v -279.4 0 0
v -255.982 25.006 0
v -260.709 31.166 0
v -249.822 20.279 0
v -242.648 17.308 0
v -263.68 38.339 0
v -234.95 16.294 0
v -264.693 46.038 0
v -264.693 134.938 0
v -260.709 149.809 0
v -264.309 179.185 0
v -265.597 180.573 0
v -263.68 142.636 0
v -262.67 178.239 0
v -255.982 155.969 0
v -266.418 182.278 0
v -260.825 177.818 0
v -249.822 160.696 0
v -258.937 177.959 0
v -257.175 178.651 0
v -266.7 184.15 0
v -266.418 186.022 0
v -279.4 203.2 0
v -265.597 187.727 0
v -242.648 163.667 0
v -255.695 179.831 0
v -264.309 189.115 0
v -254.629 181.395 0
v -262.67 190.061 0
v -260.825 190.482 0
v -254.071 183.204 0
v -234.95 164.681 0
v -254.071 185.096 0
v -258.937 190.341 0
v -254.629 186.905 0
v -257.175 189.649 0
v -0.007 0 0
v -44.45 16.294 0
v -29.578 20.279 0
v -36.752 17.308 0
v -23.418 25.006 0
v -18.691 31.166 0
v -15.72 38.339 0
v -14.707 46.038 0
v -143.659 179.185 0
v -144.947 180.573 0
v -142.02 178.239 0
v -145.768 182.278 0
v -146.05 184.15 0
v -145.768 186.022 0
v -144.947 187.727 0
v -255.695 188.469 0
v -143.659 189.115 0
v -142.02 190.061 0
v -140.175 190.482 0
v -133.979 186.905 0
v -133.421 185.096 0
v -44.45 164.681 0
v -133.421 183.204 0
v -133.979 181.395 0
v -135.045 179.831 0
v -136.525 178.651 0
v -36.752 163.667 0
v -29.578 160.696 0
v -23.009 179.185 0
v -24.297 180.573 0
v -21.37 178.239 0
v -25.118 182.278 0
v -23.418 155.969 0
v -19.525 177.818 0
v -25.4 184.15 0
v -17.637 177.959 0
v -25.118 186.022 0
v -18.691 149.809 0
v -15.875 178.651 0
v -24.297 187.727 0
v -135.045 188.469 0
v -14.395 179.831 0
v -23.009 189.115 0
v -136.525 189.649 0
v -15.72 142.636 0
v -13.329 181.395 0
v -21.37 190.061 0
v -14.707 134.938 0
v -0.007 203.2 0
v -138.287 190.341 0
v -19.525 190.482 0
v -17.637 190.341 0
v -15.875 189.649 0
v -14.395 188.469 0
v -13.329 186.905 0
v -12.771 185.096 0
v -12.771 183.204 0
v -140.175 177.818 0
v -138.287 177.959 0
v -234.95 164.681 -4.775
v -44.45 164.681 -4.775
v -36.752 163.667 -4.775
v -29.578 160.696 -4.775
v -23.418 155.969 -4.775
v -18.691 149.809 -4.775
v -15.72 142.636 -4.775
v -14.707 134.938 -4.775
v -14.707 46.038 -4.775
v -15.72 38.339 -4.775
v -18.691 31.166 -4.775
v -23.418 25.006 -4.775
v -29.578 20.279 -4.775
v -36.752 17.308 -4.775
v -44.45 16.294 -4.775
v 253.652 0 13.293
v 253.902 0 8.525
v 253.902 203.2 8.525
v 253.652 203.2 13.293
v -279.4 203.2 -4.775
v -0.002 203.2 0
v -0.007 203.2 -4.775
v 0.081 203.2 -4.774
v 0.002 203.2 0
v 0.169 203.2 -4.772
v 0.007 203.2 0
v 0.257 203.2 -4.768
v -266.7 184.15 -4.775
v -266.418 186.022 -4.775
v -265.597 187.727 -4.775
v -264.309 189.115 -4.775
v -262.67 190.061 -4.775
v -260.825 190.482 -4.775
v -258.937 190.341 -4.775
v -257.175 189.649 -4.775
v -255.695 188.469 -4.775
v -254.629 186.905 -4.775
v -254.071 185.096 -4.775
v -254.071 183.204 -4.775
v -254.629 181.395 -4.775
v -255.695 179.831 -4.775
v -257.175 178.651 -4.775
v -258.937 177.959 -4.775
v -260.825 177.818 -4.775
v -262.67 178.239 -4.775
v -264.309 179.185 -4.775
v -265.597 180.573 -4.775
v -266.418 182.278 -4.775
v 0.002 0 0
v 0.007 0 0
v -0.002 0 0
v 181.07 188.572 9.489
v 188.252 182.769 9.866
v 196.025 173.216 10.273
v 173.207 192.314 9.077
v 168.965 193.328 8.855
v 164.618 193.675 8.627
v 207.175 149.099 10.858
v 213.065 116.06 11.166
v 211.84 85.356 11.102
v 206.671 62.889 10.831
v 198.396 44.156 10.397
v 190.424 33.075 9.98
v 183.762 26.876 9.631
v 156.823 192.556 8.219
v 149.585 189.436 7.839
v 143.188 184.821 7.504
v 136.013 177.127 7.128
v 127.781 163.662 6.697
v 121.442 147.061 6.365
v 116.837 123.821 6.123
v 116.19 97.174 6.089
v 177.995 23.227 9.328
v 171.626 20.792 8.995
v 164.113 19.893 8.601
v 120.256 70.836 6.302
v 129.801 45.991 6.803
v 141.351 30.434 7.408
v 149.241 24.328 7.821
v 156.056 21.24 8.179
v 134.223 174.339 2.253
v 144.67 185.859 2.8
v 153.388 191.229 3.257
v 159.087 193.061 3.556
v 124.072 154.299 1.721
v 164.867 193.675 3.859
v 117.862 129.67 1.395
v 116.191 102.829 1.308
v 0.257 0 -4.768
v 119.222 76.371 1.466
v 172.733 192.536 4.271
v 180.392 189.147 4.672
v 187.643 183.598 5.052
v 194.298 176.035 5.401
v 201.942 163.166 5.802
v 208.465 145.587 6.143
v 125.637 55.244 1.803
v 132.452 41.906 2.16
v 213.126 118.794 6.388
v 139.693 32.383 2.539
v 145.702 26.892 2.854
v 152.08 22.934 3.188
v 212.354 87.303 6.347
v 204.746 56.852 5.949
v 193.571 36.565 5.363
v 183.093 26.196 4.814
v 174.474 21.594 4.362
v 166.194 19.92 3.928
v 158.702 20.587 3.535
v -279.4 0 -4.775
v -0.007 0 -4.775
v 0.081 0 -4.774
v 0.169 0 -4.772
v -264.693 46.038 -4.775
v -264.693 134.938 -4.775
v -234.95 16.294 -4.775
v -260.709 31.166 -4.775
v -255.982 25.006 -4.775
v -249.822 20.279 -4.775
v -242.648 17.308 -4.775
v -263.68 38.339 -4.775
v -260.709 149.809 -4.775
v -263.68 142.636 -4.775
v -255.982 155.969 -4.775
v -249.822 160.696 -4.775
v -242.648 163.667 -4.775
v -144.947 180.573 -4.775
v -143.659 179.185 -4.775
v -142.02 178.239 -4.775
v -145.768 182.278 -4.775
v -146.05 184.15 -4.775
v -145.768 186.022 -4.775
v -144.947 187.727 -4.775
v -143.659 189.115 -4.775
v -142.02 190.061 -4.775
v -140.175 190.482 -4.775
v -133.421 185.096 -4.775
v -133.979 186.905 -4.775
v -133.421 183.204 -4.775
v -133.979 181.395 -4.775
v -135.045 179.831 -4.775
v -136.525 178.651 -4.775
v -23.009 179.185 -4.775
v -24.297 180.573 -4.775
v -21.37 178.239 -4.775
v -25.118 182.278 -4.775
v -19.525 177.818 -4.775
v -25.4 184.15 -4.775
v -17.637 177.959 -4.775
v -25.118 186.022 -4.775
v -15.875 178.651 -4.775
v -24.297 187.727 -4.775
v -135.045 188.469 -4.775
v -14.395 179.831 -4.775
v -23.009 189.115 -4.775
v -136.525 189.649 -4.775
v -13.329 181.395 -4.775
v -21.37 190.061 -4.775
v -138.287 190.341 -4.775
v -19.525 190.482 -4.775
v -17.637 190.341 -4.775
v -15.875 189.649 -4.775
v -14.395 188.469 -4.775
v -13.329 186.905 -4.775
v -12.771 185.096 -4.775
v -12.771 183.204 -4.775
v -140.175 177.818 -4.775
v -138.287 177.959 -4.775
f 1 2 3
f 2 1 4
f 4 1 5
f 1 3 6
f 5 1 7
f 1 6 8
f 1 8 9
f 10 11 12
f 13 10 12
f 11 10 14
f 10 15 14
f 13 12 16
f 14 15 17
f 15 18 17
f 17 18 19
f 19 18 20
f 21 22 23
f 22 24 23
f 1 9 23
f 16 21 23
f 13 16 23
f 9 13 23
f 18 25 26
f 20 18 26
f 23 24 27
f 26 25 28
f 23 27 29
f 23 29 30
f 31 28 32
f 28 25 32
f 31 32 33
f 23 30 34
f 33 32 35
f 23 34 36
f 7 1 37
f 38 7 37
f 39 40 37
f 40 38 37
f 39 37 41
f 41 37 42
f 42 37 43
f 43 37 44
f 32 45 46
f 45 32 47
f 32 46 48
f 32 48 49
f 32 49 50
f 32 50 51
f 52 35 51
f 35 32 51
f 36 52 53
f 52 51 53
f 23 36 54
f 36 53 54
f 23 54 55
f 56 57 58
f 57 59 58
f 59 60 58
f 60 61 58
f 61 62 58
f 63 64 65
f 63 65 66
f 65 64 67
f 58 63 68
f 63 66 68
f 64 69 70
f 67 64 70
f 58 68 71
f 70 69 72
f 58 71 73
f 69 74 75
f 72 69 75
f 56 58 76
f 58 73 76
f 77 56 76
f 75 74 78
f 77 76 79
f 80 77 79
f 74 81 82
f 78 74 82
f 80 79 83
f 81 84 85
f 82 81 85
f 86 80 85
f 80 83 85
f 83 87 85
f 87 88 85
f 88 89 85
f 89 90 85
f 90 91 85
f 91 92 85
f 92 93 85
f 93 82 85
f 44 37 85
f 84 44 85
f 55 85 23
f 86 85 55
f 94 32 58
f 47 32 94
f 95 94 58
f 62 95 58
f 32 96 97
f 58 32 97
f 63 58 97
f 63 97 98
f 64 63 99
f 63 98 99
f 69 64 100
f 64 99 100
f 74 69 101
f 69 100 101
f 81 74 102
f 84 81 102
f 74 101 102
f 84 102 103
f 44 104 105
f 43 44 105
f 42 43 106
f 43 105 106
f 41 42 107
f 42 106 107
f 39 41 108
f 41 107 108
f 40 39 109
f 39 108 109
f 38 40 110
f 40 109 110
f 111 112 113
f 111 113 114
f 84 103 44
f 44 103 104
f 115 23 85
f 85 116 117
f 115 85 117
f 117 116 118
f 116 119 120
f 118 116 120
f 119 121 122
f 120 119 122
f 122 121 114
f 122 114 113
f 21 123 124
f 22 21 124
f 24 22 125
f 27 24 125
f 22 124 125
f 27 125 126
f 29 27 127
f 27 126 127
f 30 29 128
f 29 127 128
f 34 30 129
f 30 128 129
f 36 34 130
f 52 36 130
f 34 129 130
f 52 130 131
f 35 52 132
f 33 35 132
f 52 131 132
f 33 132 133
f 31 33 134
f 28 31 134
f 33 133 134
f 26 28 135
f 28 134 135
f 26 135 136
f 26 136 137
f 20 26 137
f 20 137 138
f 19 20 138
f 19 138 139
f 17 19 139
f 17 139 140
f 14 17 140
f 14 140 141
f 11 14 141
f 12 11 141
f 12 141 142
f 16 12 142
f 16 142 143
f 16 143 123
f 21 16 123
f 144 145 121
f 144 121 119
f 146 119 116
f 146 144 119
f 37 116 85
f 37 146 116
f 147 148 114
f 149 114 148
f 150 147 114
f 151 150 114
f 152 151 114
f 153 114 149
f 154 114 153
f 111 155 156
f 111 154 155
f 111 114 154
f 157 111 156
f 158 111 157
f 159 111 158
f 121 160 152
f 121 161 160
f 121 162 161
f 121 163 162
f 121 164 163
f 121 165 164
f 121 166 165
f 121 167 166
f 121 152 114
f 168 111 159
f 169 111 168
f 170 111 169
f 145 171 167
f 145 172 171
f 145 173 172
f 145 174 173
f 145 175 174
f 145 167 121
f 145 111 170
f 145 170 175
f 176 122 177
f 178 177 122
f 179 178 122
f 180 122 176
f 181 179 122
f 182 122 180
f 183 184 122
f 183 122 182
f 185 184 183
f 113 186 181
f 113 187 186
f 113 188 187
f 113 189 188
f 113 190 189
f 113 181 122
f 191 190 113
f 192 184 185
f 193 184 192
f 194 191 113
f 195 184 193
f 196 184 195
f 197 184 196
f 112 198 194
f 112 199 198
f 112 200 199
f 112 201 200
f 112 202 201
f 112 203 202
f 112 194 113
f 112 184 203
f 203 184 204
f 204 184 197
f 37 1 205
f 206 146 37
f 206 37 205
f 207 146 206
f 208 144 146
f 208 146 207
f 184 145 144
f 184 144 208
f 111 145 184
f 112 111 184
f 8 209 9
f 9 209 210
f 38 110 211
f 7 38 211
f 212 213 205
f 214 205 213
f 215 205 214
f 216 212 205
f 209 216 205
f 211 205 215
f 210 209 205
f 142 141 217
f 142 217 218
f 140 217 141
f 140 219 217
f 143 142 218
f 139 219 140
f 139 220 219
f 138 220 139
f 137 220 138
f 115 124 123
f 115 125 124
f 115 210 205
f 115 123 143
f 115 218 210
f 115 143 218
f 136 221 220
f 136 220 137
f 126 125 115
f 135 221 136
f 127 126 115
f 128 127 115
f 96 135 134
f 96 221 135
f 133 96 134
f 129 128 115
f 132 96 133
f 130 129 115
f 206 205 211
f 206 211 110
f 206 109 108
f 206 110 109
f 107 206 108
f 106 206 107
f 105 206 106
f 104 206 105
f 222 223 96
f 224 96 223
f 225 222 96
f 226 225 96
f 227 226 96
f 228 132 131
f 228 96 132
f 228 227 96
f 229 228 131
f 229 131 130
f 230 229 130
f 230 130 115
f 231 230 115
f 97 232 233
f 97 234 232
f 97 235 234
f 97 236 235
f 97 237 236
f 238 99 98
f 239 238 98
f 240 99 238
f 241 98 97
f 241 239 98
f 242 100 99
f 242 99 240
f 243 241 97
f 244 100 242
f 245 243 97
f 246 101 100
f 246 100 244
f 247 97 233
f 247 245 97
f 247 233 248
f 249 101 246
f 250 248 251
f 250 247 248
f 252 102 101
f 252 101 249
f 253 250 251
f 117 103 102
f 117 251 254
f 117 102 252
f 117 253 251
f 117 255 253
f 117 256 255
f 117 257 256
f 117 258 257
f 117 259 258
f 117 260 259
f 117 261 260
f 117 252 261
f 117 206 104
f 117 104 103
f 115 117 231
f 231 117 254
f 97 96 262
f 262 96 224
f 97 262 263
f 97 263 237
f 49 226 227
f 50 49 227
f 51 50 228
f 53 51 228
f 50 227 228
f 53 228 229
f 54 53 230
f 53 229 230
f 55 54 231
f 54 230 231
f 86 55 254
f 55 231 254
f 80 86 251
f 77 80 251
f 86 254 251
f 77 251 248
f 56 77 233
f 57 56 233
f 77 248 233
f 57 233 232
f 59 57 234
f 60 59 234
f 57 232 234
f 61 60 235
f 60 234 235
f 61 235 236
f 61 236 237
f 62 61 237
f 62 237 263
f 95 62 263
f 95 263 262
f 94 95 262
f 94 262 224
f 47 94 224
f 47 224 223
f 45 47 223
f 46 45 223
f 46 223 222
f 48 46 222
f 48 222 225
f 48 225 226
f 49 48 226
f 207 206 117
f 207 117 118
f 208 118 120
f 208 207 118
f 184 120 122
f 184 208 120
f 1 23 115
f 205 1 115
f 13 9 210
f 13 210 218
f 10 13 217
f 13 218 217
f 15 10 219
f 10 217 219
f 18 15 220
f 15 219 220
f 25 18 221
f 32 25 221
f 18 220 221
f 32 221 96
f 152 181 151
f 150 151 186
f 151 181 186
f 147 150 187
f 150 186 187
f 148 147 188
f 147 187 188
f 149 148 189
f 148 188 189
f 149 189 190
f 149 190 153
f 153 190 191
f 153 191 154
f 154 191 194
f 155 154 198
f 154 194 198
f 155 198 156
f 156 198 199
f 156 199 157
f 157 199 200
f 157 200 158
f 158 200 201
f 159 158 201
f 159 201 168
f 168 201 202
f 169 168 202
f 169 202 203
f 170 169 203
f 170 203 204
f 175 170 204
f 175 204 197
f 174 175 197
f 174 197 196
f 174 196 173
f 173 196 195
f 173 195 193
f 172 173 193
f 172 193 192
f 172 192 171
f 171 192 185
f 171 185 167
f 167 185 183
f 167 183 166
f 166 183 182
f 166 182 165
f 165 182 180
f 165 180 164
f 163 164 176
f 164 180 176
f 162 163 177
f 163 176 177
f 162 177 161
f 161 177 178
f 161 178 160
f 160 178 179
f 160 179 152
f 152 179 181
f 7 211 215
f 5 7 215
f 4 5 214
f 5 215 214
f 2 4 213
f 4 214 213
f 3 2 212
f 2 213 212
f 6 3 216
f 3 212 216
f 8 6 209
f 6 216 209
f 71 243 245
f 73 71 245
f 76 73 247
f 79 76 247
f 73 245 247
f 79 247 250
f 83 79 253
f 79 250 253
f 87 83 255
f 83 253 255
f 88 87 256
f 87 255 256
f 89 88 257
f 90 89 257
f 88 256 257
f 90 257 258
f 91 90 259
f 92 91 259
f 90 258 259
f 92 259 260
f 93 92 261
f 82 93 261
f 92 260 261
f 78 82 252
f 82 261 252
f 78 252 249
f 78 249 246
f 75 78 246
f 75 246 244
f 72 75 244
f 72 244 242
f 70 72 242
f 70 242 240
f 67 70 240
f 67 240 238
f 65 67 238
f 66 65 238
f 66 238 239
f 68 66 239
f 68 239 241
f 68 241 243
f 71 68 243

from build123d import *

# Parameters (mm, degrees)
SKETCH1_W                    = 4.7752
SKETCH1_H                    = 203.2
BASE_FLANGE1_DEPTH           = 279.4
SKETCH2_R                    = 6.35
CUT_EXTRUDE1_DEPTH           = 10.16
CUT_EXTRUDE2_DEPTH           = 4.7752
EDGE_FLANGE2_STRIP_CUT_DEPTH = 203.2
EDGE_FLANGE2_DEPTH           = 203.2
SKETCH19_RX                  = 86.8934
SKETCH19_RY                  = 48.7934
CUT_EXTRUDE3_DEPTH           = 127


# Sheet-metal steps are written as plain solids
with BuildPart() as part:
    # Sketch1 → Base-Flange1 (new body)
    with BuildSketch(Plane(origin=(0, 0, 0), x_dir=(0, 0, -1), z_dir=(1, 0, 0))):
        with Locations((2.3876, 101.6)):
            Rectangle(SKETCH1_W, SKETCH1_H)
    extrude(amount=-BASE_FLANGE1_DEPTH)

    # Sketch2 → Cut-Extrude1 (cut)
    with BuildSketch(Plane(origin=(0, 0, -4.7752), x_dir=(-1, 0, 0), z_dir=(0, 0, -1))):
        with Locations((19.05, 184.15)):
            Circle(SKETCH2_R)
        with Locations((139.7, 184.15)):
            Circle(SKETCH2_R)
        with Locations((260.35, 184.15)):
            Circle(SKETCH2_R)
    extrude(amount=-CUT_EXTRUDE1_DEPTH, mode=Mode.SUBTRACT)

    # Sketch3 → Cut-Extrude2 (cut)
    with BuildSketch(Plane(origin=(0, 0, -4.7752), x_dir=(-1, 0, 0), z_dir=(0, 0, -1))):
        with BuildLine():
            Line((14.7066, 134.9375), (14.7066, 46.0375))
            ThreePointArc((14.7066, 46.0375), (23.418240164, 25.005740164), (44.45, 16.2941))
            Line((44.45, 16.2941), (234.95, 16.2941))
            ThreePointArc((234.95, 16.2941), (255.981759836, 25.005740164), (264.6934, 46.0375))
            Line((264.6934, 46.0375), (264.6934, 134.9375))
            ThreePointArc((264.6934, 134.9375), (255.981759836, 155.969259836), (234.95, 164.6809))
            Line((234.95, 164.6809), (44.45, 164.6809))
            ThreePointArc((44.45, 164.6809), (23.418240164, 155.969259836), (14.7066, 134.9375))
        make_face()
        with BuildLine():
            Line((44.45, 153.9875), (234.95, 153.9875))
            ThreePointArc((234.95, 153.9875), (248.420384182, 148.407884182), (254, 134.9375))
            Line((254, 134.9375), (254, 46.0375))
            ThreePointArc((254, 46.0375), (248.420384182, 32.567115818), (234.95, 26.9875))
            Line((234.95, 26.9875), (44.45, 26.9875))
            ThreePointArc((44.45, 26.9875), (30.979615818, 32.567115818), (25.4, 46.0375))
            Line((25.4, 46.0375), (25.4, 134.9375))
            ThreePointArc((25.4, 134.9375), (30.979615818, 148.407884182), (44.45, 153.9875))
        make_face(mode=Mode.SUBTRACT)
    extrude(amount=-CUT_EXTRUDE2_DEPTH, mode=Mode.SUBTRACT)


with BuildPart() as cut_extrude2_kept_piece:
    # of the separate pieces the step leaves, the one the design keeps (cut_extrude2_pieces_kept)
    add(part.part.solids().sort_by_distance((0, 0, 0))[0])

    # Edge-Flange2 strip (across the edge) → Edge-Flange2 strip cut (cut)
    with BuildSketch(Plane(origin=(0, 0, 0), x_dir=(-0.052335956242937604, 0, 0.9986295347545743), z_dir=(0, 1, 0))):
        Polygon((-5.794552955, 19.325370054), (-4.768307656, -0.256556767), (0.000348098, -0.006642109), (-1.025897201, 19.575284712), align=None)
    extrude(amount=EDGE_FLANGE2_STRIP_CUT_DEPTH, mode=Mode.SUBTRACT)

    # Edge-Flange2 section (across the edge) → Edge-Flange2 (add)
    with BuildSketch(Plane(origin=(0, 0, 0), x_dir=(-0.052335956242937604, 0, 0.9986295347545743), z_dir=(0, 1, 0))):
        with BuildLine():
            Line((-4.7752, 0.006651224), (-4.7752, 254))
            Line((-4.7752, 254), (0, 254))
            Line((0, 254), (0, 0.006651224))
            ThreePointArc((0, 0.006651224), (8.7039e-05, 2.279e-06), (0.000348098, -0.006642109))
            Line((0.000348098, -0.006642109), (-4.768307656, -0.256556767))
            ThreePointArc((-4.768307656, -0.256556767), (-4.773476619, -0.124997884), (-4.7752, 0.006651224))
        make_face()
    extrude(amount=EDGE_FLANGE2_DEPTH)

    # Sketch19 → Cut-Extrude3 (cut)
    with BuildSketch(Plane(origin=(0.249914658, 0, -4.768655754), x_dir=(-0.9986295347545743, 0, -0.052335956242937624), z_dir=(0.052335956242937624, 0, -0.9986295347545743))):
        with Locations(Location((-164.843443233, 106.7816), (0, 0, 90))):
            Ellipse(SKETCH19_RX, SKETCH19_RY)
    extrude(amount=-CUT_EXTRUDE3_DEPTH, mode=Mode.SUBTRACT)


solid = cut_extrude2_kept_piece.part
